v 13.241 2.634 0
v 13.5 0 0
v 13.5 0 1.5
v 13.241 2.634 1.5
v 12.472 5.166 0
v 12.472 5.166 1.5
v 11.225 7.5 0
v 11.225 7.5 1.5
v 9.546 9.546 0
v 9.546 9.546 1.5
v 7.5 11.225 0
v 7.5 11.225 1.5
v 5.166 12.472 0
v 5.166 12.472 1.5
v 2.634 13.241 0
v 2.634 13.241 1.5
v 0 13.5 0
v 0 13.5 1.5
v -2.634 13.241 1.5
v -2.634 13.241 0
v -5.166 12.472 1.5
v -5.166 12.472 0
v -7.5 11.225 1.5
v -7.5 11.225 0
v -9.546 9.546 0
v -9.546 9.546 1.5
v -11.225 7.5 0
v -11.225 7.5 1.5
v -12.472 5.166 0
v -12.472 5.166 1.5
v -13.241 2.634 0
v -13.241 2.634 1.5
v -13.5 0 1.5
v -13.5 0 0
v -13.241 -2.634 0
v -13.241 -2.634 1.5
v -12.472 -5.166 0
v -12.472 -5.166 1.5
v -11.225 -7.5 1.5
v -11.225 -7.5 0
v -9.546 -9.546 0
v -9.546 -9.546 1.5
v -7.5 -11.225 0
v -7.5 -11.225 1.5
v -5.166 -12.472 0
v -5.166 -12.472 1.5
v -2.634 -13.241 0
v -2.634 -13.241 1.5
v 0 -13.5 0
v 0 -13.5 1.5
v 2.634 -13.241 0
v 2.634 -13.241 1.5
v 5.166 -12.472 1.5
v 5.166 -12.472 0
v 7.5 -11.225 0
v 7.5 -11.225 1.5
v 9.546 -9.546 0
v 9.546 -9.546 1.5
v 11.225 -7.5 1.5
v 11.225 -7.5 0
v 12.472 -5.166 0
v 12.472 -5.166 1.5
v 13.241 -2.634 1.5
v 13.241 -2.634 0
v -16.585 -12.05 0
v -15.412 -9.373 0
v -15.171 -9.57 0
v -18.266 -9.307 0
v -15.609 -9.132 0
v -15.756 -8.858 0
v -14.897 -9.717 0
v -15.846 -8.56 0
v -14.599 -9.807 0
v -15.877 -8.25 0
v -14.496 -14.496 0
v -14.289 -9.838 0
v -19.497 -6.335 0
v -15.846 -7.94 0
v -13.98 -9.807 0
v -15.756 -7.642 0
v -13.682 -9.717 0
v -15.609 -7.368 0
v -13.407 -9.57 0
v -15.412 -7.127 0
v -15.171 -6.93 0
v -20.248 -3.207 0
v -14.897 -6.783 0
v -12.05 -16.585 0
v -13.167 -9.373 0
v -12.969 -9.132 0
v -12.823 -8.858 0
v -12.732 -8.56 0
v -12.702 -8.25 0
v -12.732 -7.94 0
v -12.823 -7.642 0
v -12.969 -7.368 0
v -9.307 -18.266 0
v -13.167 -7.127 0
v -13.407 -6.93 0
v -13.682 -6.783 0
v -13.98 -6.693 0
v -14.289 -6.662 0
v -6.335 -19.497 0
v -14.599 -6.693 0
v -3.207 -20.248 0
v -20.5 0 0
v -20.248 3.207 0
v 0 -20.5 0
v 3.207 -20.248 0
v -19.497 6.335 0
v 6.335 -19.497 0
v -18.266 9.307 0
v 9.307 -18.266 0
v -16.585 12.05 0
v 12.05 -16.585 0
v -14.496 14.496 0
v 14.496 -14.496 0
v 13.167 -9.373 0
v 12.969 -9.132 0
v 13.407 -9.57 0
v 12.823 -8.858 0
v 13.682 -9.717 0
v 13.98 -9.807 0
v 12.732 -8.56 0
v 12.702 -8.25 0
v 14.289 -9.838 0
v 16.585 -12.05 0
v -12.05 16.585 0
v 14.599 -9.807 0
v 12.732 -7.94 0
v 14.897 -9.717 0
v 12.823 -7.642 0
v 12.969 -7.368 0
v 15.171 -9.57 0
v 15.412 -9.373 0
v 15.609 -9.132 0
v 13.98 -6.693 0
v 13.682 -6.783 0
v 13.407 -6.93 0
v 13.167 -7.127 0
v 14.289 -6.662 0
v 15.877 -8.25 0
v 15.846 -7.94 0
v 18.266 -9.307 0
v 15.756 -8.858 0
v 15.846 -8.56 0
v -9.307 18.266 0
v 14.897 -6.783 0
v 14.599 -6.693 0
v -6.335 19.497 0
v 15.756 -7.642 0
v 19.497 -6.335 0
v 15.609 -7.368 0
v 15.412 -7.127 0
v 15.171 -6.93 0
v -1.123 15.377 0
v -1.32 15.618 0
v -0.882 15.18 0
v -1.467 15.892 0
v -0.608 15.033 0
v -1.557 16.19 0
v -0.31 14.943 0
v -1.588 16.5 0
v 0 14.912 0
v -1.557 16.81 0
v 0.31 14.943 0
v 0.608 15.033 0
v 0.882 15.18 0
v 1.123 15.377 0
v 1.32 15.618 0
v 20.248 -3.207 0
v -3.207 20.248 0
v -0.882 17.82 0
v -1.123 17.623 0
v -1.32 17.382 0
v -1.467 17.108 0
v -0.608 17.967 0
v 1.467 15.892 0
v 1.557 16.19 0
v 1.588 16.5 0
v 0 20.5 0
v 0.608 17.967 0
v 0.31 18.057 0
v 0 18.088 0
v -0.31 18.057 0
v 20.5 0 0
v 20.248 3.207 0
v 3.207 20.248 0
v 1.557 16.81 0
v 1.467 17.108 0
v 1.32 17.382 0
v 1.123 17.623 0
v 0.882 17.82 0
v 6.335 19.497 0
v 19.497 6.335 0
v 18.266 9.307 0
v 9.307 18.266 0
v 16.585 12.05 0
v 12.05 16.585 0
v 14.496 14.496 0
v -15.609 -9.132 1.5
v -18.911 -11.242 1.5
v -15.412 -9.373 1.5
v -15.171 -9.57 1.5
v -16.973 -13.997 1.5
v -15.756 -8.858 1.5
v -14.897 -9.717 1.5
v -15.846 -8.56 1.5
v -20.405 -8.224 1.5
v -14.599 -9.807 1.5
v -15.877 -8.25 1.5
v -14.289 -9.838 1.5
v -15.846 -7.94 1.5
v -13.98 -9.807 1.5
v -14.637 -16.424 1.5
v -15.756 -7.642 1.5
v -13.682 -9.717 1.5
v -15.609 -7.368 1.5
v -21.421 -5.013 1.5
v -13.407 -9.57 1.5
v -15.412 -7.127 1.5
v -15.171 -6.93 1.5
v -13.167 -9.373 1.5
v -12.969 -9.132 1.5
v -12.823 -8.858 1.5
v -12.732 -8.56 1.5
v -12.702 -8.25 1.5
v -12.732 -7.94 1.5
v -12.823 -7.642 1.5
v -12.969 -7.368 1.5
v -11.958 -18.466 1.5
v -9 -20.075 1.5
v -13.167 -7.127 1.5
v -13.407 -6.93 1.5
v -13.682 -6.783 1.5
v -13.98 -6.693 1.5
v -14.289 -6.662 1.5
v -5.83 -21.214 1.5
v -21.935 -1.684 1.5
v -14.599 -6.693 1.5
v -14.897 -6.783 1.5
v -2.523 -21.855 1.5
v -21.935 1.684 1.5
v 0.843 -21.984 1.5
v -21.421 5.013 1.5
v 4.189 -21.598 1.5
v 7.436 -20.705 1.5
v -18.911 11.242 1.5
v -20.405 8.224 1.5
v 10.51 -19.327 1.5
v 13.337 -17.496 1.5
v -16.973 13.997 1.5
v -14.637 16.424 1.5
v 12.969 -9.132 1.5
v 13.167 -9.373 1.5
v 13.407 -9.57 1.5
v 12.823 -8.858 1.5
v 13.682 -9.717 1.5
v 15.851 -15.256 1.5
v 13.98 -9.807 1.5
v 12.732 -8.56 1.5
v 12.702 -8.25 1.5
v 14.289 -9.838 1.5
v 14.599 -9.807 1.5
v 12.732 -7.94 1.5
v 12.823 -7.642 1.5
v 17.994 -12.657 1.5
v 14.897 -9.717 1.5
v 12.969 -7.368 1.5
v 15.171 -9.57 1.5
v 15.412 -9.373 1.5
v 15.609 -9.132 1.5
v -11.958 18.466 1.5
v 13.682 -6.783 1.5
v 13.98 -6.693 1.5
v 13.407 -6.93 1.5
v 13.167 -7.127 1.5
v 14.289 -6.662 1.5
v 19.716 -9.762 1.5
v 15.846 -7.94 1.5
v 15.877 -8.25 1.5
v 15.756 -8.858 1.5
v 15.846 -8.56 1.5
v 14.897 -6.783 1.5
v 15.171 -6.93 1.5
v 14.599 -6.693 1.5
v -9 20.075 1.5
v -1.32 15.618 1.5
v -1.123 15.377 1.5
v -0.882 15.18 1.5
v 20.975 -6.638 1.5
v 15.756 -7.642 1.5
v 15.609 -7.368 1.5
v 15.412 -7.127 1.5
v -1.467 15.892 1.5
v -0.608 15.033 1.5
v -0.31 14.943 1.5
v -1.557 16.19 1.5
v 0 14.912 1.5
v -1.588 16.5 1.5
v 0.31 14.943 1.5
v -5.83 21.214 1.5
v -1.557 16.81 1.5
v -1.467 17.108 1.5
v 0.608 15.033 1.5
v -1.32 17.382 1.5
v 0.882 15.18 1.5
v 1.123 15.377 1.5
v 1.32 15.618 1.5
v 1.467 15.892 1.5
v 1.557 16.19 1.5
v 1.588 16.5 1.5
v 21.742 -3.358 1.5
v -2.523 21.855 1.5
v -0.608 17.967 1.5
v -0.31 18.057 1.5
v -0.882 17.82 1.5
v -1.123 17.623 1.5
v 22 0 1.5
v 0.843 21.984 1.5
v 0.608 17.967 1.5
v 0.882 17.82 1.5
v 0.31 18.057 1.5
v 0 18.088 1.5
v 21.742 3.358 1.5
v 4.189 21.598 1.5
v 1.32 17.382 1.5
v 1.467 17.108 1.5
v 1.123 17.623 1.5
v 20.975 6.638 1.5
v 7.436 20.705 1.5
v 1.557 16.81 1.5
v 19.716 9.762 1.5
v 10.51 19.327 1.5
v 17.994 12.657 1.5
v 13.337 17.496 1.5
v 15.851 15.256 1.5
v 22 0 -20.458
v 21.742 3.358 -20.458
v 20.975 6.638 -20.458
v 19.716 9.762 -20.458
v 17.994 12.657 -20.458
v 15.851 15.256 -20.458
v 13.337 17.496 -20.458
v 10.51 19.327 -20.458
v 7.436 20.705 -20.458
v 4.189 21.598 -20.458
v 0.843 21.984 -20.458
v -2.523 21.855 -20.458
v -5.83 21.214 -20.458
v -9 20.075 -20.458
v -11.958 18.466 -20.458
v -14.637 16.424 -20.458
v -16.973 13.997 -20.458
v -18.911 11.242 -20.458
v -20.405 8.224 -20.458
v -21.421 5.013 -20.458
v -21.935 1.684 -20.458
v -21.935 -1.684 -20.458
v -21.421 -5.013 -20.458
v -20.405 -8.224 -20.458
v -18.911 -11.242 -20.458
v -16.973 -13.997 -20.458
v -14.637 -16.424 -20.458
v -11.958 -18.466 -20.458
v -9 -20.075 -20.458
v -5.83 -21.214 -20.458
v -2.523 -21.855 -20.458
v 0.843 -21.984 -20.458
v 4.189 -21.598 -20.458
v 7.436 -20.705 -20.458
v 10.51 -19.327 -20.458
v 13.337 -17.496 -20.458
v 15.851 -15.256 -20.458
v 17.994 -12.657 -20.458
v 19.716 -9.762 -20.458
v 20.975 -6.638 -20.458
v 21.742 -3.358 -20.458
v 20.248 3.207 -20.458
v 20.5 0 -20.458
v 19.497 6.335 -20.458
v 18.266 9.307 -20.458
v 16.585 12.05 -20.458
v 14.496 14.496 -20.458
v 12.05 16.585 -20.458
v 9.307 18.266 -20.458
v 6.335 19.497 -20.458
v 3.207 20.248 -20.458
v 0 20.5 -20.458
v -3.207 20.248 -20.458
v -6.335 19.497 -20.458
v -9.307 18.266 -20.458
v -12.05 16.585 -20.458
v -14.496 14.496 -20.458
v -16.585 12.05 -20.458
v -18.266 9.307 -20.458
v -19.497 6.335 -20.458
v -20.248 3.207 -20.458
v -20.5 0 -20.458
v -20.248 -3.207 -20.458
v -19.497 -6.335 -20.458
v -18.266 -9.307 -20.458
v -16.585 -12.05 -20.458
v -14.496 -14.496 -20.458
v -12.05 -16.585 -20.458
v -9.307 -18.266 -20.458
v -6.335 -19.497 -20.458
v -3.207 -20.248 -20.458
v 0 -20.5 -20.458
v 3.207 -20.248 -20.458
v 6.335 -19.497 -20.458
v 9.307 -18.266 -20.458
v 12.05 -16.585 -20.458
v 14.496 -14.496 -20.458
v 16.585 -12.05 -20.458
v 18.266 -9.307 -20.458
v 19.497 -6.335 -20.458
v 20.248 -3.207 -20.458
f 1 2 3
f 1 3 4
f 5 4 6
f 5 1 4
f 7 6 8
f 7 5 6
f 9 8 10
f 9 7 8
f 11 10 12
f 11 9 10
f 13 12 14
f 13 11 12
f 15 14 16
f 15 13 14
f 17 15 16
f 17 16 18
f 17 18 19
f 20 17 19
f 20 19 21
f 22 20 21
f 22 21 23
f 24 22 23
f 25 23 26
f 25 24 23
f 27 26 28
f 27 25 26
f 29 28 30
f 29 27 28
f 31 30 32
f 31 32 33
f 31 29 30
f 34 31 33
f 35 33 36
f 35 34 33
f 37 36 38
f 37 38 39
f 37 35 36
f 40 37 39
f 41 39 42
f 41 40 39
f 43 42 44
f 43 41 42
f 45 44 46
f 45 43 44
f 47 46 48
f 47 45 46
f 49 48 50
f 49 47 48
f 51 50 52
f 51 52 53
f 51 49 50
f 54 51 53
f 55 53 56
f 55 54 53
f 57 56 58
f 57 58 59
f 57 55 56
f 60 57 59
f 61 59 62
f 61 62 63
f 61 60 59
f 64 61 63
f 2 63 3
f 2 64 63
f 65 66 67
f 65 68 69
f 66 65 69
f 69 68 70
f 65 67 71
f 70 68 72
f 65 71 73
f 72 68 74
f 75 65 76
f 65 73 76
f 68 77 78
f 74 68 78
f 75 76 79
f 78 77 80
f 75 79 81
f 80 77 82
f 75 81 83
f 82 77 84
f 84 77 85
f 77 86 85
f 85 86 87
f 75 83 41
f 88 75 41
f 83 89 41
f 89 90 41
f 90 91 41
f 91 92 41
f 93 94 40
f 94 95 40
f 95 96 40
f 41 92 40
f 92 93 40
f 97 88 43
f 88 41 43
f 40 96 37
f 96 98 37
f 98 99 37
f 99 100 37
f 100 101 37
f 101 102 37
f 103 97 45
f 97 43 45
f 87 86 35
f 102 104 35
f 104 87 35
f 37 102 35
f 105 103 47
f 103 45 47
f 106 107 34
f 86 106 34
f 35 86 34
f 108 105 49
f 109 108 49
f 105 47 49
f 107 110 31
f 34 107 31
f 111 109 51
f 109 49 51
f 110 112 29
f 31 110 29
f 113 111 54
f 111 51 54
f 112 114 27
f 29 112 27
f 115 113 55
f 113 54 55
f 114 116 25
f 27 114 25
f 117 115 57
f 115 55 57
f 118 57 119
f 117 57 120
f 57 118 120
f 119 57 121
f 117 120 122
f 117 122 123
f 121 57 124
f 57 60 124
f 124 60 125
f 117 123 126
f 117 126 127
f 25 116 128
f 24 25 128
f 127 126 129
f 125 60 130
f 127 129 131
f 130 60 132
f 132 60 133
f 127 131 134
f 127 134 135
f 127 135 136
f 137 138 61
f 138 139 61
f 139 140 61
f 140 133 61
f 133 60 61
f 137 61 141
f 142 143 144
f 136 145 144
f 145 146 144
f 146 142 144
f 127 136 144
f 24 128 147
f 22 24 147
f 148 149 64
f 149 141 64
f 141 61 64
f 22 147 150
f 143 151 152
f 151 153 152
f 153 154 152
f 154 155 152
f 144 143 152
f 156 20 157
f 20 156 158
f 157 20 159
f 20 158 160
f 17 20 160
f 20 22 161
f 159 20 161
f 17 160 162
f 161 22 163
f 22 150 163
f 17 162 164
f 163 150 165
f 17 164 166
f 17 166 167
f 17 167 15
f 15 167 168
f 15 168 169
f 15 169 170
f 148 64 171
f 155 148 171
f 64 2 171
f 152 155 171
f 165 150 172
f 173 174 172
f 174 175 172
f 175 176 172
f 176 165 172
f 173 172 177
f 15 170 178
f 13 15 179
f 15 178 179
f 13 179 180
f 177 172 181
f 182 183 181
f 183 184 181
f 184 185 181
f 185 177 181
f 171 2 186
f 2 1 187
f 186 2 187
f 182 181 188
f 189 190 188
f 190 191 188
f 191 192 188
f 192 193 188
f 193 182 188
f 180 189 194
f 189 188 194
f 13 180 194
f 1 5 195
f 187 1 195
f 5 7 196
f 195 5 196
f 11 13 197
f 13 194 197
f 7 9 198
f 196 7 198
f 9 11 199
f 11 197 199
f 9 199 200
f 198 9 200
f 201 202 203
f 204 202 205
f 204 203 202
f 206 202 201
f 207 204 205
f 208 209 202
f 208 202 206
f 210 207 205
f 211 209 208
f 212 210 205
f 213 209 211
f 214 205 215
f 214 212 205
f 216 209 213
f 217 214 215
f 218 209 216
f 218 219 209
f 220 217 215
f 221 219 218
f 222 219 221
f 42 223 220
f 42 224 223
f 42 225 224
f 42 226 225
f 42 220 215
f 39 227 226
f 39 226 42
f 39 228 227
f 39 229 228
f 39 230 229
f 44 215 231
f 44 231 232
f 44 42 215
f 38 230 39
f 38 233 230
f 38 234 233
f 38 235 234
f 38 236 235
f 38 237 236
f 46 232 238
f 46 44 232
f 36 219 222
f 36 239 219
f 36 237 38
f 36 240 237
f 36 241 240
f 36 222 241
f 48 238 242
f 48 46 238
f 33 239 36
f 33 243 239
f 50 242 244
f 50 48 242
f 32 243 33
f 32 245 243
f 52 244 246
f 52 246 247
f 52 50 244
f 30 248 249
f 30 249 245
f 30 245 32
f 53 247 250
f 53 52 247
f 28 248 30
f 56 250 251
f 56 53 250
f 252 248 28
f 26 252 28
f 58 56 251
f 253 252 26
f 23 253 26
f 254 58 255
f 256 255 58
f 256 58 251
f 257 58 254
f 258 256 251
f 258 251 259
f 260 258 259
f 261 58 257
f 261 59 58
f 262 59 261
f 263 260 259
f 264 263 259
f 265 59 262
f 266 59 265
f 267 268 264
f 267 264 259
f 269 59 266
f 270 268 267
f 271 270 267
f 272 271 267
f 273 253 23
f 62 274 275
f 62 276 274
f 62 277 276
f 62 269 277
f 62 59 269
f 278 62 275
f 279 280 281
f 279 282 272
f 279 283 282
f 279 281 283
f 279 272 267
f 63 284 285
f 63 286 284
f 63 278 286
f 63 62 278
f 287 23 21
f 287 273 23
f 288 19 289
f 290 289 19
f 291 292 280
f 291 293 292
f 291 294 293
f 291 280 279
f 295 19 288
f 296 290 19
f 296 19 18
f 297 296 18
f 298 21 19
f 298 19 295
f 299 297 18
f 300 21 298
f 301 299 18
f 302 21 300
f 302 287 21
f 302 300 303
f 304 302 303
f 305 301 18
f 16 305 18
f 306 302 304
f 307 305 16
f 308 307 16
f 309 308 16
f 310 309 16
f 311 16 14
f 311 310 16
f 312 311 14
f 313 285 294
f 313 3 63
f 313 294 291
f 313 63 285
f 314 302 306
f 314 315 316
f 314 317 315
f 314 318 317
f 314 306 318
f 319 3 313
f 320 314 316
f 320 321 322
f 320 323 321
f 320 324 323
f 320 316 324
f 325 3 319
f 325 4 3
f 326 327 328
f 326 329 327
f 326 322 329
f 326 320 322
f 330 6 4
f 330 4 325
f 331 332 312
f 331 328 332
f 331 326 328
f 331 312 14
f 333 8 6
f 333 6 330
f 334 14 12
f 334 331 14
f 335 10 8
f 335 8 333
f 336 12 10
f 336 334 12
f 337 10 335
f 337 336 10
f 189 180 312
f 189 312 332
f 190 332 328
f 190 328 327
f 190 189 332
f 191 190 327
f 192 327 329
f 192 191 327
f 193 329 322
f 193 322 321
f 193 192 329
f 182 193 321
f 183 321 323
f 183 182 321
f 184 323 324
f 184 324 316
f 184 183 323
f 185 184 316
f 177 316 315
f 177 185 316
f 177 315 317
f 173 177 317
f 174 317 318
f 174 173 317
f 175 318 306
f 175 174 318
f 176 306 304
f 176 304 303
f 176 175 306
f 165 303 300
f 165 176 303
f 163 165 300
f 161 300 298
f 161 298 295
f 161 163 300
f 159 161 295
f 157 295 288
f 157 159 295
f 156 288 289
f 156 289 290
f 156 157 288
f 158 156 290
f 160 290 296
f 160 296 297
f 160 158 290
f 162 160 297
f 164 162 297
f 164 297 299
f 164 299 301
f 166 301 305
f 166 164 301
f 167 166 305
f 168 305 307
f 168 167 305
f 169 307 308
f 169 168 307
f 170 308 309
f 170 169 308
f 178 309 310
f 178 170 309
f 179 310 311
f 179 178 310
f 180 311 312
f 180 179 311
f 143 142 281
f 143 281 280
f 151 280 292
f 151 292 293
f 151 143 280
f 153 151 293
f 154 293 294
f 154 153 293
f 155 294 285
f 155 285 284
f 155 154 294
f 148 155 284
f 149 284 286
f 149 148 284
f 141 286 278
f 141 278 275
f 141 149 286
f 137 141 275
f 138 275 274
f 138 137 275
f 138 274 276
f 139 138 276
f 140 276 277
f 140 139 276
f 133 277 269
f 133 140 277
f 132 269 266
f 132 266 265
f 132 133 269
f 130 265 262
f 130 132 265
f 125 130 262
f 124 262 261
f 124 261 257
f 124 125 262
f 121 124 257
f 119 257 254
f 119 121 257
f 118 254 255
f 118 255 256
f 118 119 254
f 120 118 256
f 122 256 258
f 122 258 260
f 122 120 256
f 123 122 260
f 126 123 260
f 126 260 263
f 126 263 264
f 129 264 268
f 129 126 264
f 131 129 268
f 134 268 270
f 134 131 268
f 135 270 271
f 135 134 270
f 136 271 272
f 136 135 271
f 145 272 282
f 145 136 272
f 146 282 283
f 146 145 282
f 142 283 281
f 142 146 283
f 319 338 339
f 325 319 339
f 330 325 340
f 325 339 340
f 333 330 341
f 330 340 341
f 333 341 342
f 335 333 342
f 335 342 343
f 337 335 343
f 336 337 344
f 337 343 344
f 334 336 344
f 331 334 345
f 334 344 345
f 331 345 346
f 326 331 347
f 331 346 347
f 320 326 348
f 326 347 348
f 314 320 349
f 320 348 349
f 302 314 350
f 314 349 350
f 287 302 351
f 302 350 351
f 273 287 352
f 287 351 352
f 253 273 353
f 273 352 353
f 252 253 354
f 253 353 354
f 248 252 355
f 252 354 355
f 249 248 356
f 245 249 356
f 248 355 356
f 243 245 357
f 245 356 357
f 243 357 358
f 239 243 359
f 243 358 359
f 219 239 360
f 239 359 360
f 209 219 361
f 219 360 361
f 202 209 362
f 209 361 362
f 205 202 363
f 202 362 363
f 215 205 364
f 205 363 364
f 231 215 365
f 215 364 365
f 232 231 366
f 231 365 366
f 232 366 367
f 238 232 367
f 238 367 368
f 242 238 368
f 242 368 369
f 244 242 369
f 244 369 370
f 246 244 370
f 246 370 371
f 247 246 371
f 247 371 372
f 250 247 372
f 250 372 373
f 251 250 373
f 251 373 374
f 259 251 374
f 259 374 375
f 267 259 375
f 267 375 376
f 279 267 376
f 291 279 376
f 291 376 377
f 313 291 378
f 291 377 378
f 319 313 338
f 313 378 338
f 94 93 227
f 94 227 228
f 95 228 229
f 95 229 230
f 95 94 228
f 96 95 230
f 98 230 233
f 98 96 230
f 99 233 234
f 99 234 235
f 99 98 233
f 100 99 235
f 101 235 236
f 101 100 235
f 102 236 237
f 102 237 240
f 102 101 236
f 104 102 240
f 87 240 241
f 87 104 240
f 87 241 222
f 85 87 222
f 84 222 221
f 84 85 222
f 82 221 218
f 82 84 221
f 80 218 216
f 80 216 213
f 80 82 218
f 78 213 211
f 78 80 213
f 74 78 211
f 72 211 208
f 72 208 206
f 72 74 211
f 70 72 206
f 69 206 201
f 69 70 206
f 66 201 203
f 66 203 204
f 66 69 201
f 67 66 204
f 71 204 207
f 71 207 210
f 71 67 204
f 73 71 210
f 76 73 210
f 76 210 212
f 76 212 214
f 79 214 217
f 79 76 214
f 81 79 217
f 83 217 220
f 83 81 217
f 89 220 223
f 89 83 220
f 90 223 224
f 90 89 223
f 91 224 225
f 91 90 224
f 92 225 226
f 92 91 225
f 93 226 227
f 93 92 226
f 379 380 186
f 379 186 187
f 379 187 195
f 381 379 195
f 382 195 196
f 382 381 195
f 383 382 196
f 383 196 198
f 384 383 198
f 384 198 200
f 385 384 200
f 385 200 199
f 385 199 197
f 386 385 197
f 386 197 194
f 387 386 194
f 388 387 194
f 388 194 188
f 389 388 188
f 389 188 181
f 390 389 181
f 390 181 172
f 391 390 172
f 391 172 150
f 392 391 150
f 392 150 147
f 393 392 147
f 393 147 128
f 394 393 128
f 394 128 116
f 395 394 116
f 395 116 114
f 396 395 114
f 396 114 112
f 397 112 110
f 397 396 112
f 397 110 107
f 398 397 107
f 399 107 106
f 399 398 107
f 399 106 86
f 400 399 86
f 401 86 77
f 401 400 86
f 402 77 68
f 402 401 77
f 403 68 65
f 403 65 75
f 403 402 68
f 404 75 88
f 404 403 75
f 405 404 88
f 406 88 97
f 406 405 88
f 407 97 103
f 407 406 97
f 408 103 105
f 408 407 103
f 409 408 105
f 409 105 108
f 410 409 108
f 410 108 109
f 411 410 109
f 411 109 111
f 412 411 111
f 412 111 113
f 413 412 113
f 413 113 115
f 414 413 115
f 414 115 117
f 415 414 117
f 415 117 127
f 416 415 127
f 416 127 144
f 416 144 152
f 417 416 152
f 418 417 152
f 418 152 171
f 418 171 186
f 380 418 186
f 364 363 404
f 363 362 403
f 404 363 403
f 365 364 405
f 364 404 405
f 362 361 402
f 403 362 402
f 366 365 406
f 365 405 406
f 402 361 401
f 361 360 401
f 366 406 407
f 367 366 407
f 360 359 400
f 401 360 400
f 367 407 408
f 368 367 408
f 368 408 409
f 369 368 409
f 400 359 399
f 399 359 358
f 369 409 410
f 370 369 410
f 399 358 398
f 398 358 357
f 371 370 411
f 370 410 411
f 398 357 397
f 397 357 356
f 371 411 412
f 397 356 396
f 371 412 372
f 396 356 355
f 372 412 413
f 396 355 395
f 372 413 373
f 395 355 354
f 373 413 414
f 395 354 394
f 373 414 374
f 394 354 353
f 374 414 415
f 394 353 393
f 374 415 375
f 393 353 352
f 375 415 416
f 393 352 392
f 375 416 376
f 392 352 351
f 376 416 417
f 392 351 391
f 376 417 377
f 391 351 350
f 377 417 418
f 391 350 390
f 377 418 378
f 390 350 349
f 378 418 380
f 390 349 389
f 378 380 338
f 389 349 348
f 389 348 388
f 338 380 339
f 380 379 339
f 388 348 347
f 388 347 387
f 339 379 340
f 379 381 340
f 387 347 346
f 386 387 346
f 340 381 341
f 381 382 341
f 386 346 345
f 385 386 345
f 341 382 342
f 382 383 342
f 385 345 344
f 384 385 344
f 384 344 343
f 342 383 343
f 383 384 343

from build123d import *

# Parameters (mm, degrees)
SKETCH1_R           = 20.5
SKETCH1_R_2         = 1.5875
SKETCH1_R_3         = 13.5
EXTRUDE1_DEPTH      = 1.5
BOSS_EXTRUDE1_START = -21.9577
SKETCH2_R           = 22
SKETCH2_R_2         = 20.5
BOSS_EXTRUDE1_DEPTH = 21.9577


with BuildPart() as part:
    # Sketch1 → Extrude1 (new body)
    # profile 1 of 4: a face of its own
    with BuildSketch(Plane.XY):
        Circle(SKETCH1_R)
        with Locations((-14.289419162, 8.25)):
            Circle(SKETCH1_R_2, mode=Mode.SUBTRACT)
        with Locations((0, -16.5)):
            Circle(SKETCH1_R_2, mode=Mode.SUBTRACT)
        with Locations((14.289419162, 8.25)):
            Circle(SKETCH1_R_2, mode=Mode.SUBTRACT)
        with Locations((-14.289419162, -8.25)):
            Circle(SKETCH1_R_2, mode=Mode.SUBTRACT)
        with Locations((14.289419162, -8.25)):
            Circle(SKETCH1_R_2, mode=Mode.SUBTRACT)
        with Locations((0, 16.5)):
            Circle(SKETCH1_R_2, mode=Mode.SUBTRACT)
        Circle(SKETCH1_R_3, mode=Mode.SUBTRACT)
    # profile 2 of 4: a face of its own
    with BuildSketch(Plane.XY):
        with Locations((-14.289419162, 8.25)):
            Circle(SKETCH1_R_2)
    # profile 3 of 4: a face of its own
    with BuildSketch(Plane.XY):
        with Locations((14.289419162, 8.25)):
            Circle(SKETCH1_R_2)
    # profile 4 of 4: a face of its own
    with BuildSketch(Plane.XY):
        with Locations((0, -16.5)):
            Circle(SKETCH1_R_2)
    extrude(amount=EXTRUDE1_DEPTH)

    # Sketch2 → Boss-Extrude1 (add)
    with BuildSketch(Plane.XY.offset(1.5).offset(BOSS_EXTRUDE1_START)):
        Circle(SKETCH2_R)
        Circle(SKETCH2_R_2, mode=Mode.SUBTRACT)
    extrude(amount=BOSS_EXTRUDE1_DEPTH)


solid = part.part
